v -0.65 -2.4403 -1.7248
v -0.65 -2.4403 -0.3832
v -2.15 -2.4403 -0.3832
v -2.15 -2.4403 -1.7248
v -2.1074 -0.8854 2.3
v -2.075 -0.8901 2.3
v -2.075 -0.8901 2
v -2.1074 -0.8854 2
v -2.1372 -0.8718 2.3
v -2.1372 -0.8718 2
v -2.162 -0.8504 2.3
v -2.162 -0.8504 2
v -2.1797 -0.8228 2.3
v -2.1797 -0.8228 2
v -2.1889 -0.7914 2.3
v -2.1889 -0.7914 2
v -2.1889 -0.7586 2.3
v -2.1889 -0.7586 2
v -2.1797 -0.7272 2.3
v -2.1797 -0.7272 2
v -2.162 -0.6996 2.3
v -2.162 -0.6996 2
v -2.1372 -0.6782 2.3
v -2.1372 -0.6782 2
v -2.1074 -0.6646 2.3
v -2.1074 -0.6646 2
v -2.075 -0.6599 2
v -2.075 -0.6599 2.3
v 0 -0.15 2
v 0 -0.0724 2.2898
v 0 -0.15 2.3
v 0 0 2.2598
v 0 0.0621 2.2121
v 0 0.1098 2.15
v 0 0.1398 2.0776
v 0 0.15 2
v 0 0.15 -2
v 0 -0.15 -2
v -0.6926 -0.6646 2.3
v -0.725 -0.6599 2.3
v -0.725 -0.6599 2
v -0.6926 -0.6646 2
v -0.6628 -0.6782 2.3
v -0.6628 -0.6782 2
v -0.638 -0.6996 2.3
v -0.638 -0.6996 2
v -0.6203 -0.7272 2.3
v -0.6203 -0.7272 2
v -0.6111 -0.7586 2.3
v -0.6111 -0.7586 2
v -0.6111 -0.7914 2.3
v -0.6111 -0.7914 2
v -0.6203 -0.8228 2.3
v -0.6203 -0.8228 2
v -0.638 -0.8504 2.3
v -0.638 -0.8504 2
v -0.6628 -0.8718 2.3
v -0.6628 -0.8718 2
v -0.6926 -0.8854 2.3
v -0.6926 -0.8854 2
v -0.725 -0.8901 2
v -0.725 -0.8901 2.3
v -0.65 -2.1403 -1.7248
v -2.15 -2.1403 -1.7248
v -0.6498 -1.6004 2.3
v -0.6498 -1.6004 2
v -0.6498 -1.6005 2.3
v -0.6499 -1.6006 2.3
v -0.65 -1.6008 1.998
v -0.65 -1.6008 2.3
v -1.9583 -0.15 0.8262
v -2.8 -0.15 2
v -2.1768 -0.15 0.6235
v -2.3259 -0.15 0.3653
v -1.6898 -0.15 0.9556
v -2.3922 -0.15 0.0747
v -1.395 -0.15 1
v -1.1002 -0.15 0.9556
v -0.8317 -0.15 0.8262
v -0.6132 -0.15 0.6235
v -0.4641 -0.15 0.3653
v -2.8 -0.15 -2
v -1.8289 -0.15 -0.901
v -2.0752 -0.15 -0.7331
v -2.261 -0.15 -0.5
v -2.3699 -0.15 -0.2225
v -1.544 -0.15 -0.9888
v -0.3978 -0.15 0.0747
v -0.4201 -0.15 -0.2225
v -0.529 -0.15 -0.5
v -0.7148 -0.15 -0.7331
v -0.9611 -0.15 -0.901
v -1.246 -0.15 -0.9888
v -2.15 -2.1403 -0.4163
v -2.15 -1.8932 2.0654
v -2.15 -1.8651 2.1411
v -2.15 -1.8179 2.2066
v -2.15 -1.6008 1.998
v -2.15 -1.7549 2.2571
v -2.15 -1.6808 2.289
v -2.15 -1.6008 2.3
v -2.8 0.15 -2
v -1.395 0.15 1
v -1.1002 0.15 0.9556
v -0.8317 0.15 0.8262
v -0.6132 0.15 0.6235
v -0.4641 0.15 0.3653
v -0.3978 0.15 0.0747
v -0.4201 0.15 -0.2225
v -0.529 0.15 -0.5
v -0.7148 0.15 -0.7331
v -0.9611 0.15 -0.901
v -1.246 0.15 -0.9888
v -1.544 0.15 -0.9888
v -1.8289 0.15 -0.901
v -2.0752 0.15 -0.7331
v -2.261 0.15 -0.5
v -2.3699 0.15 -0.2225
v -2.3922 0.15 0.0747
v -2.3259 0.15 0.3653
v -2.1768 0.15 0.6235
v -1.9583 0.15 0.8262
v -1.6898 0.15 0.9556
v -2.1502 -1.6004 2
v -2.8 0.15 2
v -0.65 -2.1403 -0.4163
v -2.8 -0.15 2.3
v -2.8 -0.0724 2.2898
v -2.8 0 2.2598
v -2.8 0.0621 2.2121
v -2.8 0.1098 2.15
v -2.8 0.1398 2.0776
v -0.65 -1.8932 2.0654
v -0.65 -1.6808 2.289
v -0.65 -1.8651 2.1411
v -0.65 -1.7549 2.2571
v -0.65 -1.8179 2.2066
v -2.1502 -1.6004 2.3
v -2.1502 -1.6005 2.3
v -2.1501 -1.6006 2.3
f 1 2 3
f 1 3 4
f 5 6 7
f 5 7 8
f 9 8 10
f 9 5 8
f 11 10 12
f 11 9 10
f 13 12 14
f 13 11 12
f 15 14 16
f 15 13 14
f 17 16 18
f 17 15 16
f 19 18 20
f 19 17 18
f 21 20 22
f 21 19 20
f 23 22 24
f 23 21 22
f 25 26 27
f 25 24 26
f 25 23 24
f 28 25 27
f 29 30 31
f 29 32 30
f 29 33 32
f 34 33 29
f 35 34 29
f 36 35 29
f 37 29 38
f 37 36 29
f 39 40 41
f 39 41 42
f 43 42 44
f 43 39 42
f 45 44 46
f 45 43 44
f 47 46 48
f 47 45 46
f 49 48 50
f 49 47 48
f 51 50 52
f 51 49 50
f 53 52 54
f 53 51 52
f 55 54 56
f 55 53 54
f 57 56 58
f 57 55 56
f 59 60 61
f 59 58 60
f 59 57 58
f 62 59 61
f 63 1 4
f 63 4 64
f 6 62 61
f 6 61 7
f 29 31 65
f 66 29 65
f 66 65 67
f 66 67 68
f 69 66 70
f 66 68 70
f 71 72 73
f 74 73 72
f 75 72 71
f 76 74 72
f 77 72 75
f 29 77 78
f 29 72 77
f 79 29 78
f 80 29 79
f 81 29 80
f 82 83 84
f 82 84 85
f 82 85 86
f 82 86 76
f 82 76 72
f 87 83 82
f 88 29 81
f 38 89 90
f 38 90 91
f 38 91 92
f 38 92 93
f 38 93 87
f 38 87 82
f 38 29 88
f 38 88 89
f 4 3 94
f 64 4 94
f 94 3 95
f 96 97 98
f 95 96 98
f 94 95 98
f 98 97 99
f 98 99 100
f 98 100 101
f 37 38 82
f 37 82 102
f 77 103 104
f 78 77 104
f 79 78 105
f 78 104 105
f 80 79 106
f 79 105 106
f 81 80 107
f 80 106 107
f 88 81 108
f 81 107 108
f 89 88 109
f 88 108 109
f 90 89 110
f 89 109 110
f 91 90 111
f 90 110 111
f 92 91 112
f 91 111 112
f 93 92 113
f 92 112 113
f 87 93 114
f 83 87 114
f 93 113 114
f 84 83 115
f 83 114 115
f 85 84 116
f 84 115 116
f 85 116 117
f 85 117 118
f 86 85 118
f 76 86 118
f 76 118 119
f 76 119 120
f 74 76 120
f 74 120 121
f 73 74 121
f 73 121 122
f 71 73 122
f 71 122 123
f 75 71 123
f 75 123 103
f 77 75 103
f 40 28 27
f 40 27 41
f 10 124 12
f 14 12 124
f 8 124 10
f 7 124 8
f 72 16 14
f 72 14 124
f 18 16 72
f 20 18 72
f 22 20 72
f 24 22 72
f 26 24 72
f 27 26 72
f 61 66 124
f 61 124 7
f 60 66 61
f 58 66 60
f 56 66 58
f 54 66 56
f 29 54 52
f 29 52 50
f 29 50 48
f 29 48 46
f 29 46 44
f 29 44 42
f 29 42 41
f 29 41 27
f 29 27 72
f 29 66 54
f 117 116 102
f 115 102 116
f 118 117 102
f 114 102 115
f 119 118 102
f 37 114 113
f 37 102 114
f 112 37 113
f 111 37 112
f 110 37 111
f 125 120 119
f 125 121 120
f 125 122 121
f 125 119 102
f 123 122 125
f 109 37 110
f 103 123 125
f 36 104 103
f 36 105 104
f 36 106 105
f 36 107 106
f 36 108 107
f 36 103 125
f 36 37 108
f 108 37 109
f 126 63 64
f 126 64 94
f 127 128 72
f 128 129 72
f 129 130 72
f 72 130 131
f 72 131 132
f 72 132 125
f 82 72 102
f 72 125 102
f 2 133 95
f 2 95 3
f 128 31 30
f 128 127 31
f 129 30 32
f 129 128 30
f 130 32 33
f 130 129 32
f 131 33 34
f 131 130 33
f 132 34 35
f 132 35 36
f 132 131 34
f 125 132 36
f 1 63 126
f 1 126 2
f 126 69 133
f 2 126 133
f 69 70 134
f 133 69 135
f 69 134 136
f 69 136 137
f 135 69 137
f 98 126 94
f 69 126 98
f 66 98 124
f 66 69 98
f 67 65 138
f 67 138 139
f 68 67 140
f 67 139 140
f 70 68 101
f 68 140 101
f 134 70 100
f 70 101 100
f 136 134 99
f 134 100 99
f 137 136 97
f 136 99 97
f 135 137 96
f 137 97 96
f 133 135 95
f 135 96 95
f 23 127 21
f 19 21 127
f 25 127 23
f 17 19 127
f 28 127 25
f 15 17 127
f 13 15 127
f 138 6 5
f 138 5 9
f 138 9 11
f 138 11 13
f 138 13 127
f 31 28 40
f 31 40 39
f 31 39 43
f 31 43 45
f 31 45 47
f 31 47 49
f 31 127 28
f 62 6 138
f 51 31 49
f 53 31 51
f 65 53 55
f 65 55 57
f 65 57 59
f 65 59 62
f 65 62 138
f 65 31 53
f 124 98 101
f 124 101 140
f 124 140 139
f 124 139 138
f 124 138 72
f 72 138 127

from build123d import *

# Parameters (mm, degrees)
EXTRUDE_1_DEPTH     = 2.8
SKETCH_2_R          = 1
CUT_EXTRUDE_1_DEPTH = 0.35
CUT_EXTRUDE_2_DEPTH = 5.84
FILLET_1_R          = 0.3
FILLET_2_R          = 0.3
CUT_EXTRUDE_3_DEPTH = 0.38


with BuildPart() as part:
    # Эскиз1 → Бобышка-Вытянуть1 (new body)
    with BuildSketch(Plane(origin=(0, 0, 0), x_dir=(0, 0, -1), z_dir=(1, 0, 0))):
        Polygon((-2, -0.15), (2, -0.15), (2, 0.15), (-2.3, 0.15), (-2.3, -0.15), (-2.3, -1.840737663), (0.383188303, -2.440296098), (1.724844915, -2.440296098), (1.724844915, -2.140296098), (0.416297552, -2.140296098), (-2, -1.600374403), align=None)
    extrude(amount=-EXTRUDE_1_DEPTH)

    # Эскиз2 → Вырез-Вытянуть1 (cut)
    with BuildSketch(Plane(origin=(0, 0.15, 0), x_dir=(1, 0, 0), z_dir=(0, 1, 0))):
        with Locations(Location((-1.395, 0, 0), (0, 0, 270))):
            Circle(SKETCH_2_R)
    extrude(amount=-CUT_EXTRUDE_1_DEPTH, mode=Mode.SUBTRACT)

    # Эскиз3 → Вырез-Вытянуть2 (cut)
    with BuildSketch(Plane.XY.offset(2.3)):
        Polygon((0.104580197, -0.15), (0, -0.15), (0, -1.840737663), (-0.507452735, -1.840737663), (-0.65, -1.840737663), (-0.65, -2.582228504), (-2.15, -2.582228504), (-2.15, -1.840737663), (-2.8, -1.840737663), (-2.8, -0.15), (-2.942884437, -0.15), (-2.942884437, -2.979664713), (0.104580197, -2.979664713), align=None)
        Polygon((-2.8, -1.840737663), (-2.15, -1.840737663), (-2.15, -1.600830544), (-2.8, -0.15), align=None)
        Polygon((0, -1.840737663), (0, -0.15), (-0.65, -1.600830544), (-0.65, -1.840737663), (-0.507452735, -1.840737663), align=None)
    extrude(amount=-CUT_EXTRUDE_2_DEPTH, mode=Mode.SUBTRACT)

    # Скругление1
    fillet_1_edges = [part.edges().sort_by_distance(p)[0] for p in [
        (-1.4, 0.15, 2.3),
    ]]
    fillet(fillet_1_edges, radius=FILLET_1_R)

    # Скругление2
    fillet_2_edges = [part.edges().sort_by_distance(p)[0] for p in [
        (-1.4, -1.840737663, 2.3),
    ]]
    fillet(fillet_2_edges, radius=FILLET_2_R)

    # Эскиз4 → Вырез-Вытянуть3 (cut)
    with BuildSketch(Plane.XY.offset(2.3)):
        with BuildLine():
            Line((-2.075, -0.659889324), (-0.725, -0.659889324))
            ThreePointArc((-0.725, -0.659889324), (-0.609889324, -0.775), (-0.725, -0.890110676))
            Line((-0.725, -0.890110676), (-2.075, -0.890110676))
            ThreePointArc((-2.075, -0.890110676), (-2.190110676, -0.775), (-2.075, -0.659889324))
        make_face()
    extrude(amount=-CUT_EXTRUDE_3_DEPTH, mode=Mode.SUBTRACT)


solid = part.part
